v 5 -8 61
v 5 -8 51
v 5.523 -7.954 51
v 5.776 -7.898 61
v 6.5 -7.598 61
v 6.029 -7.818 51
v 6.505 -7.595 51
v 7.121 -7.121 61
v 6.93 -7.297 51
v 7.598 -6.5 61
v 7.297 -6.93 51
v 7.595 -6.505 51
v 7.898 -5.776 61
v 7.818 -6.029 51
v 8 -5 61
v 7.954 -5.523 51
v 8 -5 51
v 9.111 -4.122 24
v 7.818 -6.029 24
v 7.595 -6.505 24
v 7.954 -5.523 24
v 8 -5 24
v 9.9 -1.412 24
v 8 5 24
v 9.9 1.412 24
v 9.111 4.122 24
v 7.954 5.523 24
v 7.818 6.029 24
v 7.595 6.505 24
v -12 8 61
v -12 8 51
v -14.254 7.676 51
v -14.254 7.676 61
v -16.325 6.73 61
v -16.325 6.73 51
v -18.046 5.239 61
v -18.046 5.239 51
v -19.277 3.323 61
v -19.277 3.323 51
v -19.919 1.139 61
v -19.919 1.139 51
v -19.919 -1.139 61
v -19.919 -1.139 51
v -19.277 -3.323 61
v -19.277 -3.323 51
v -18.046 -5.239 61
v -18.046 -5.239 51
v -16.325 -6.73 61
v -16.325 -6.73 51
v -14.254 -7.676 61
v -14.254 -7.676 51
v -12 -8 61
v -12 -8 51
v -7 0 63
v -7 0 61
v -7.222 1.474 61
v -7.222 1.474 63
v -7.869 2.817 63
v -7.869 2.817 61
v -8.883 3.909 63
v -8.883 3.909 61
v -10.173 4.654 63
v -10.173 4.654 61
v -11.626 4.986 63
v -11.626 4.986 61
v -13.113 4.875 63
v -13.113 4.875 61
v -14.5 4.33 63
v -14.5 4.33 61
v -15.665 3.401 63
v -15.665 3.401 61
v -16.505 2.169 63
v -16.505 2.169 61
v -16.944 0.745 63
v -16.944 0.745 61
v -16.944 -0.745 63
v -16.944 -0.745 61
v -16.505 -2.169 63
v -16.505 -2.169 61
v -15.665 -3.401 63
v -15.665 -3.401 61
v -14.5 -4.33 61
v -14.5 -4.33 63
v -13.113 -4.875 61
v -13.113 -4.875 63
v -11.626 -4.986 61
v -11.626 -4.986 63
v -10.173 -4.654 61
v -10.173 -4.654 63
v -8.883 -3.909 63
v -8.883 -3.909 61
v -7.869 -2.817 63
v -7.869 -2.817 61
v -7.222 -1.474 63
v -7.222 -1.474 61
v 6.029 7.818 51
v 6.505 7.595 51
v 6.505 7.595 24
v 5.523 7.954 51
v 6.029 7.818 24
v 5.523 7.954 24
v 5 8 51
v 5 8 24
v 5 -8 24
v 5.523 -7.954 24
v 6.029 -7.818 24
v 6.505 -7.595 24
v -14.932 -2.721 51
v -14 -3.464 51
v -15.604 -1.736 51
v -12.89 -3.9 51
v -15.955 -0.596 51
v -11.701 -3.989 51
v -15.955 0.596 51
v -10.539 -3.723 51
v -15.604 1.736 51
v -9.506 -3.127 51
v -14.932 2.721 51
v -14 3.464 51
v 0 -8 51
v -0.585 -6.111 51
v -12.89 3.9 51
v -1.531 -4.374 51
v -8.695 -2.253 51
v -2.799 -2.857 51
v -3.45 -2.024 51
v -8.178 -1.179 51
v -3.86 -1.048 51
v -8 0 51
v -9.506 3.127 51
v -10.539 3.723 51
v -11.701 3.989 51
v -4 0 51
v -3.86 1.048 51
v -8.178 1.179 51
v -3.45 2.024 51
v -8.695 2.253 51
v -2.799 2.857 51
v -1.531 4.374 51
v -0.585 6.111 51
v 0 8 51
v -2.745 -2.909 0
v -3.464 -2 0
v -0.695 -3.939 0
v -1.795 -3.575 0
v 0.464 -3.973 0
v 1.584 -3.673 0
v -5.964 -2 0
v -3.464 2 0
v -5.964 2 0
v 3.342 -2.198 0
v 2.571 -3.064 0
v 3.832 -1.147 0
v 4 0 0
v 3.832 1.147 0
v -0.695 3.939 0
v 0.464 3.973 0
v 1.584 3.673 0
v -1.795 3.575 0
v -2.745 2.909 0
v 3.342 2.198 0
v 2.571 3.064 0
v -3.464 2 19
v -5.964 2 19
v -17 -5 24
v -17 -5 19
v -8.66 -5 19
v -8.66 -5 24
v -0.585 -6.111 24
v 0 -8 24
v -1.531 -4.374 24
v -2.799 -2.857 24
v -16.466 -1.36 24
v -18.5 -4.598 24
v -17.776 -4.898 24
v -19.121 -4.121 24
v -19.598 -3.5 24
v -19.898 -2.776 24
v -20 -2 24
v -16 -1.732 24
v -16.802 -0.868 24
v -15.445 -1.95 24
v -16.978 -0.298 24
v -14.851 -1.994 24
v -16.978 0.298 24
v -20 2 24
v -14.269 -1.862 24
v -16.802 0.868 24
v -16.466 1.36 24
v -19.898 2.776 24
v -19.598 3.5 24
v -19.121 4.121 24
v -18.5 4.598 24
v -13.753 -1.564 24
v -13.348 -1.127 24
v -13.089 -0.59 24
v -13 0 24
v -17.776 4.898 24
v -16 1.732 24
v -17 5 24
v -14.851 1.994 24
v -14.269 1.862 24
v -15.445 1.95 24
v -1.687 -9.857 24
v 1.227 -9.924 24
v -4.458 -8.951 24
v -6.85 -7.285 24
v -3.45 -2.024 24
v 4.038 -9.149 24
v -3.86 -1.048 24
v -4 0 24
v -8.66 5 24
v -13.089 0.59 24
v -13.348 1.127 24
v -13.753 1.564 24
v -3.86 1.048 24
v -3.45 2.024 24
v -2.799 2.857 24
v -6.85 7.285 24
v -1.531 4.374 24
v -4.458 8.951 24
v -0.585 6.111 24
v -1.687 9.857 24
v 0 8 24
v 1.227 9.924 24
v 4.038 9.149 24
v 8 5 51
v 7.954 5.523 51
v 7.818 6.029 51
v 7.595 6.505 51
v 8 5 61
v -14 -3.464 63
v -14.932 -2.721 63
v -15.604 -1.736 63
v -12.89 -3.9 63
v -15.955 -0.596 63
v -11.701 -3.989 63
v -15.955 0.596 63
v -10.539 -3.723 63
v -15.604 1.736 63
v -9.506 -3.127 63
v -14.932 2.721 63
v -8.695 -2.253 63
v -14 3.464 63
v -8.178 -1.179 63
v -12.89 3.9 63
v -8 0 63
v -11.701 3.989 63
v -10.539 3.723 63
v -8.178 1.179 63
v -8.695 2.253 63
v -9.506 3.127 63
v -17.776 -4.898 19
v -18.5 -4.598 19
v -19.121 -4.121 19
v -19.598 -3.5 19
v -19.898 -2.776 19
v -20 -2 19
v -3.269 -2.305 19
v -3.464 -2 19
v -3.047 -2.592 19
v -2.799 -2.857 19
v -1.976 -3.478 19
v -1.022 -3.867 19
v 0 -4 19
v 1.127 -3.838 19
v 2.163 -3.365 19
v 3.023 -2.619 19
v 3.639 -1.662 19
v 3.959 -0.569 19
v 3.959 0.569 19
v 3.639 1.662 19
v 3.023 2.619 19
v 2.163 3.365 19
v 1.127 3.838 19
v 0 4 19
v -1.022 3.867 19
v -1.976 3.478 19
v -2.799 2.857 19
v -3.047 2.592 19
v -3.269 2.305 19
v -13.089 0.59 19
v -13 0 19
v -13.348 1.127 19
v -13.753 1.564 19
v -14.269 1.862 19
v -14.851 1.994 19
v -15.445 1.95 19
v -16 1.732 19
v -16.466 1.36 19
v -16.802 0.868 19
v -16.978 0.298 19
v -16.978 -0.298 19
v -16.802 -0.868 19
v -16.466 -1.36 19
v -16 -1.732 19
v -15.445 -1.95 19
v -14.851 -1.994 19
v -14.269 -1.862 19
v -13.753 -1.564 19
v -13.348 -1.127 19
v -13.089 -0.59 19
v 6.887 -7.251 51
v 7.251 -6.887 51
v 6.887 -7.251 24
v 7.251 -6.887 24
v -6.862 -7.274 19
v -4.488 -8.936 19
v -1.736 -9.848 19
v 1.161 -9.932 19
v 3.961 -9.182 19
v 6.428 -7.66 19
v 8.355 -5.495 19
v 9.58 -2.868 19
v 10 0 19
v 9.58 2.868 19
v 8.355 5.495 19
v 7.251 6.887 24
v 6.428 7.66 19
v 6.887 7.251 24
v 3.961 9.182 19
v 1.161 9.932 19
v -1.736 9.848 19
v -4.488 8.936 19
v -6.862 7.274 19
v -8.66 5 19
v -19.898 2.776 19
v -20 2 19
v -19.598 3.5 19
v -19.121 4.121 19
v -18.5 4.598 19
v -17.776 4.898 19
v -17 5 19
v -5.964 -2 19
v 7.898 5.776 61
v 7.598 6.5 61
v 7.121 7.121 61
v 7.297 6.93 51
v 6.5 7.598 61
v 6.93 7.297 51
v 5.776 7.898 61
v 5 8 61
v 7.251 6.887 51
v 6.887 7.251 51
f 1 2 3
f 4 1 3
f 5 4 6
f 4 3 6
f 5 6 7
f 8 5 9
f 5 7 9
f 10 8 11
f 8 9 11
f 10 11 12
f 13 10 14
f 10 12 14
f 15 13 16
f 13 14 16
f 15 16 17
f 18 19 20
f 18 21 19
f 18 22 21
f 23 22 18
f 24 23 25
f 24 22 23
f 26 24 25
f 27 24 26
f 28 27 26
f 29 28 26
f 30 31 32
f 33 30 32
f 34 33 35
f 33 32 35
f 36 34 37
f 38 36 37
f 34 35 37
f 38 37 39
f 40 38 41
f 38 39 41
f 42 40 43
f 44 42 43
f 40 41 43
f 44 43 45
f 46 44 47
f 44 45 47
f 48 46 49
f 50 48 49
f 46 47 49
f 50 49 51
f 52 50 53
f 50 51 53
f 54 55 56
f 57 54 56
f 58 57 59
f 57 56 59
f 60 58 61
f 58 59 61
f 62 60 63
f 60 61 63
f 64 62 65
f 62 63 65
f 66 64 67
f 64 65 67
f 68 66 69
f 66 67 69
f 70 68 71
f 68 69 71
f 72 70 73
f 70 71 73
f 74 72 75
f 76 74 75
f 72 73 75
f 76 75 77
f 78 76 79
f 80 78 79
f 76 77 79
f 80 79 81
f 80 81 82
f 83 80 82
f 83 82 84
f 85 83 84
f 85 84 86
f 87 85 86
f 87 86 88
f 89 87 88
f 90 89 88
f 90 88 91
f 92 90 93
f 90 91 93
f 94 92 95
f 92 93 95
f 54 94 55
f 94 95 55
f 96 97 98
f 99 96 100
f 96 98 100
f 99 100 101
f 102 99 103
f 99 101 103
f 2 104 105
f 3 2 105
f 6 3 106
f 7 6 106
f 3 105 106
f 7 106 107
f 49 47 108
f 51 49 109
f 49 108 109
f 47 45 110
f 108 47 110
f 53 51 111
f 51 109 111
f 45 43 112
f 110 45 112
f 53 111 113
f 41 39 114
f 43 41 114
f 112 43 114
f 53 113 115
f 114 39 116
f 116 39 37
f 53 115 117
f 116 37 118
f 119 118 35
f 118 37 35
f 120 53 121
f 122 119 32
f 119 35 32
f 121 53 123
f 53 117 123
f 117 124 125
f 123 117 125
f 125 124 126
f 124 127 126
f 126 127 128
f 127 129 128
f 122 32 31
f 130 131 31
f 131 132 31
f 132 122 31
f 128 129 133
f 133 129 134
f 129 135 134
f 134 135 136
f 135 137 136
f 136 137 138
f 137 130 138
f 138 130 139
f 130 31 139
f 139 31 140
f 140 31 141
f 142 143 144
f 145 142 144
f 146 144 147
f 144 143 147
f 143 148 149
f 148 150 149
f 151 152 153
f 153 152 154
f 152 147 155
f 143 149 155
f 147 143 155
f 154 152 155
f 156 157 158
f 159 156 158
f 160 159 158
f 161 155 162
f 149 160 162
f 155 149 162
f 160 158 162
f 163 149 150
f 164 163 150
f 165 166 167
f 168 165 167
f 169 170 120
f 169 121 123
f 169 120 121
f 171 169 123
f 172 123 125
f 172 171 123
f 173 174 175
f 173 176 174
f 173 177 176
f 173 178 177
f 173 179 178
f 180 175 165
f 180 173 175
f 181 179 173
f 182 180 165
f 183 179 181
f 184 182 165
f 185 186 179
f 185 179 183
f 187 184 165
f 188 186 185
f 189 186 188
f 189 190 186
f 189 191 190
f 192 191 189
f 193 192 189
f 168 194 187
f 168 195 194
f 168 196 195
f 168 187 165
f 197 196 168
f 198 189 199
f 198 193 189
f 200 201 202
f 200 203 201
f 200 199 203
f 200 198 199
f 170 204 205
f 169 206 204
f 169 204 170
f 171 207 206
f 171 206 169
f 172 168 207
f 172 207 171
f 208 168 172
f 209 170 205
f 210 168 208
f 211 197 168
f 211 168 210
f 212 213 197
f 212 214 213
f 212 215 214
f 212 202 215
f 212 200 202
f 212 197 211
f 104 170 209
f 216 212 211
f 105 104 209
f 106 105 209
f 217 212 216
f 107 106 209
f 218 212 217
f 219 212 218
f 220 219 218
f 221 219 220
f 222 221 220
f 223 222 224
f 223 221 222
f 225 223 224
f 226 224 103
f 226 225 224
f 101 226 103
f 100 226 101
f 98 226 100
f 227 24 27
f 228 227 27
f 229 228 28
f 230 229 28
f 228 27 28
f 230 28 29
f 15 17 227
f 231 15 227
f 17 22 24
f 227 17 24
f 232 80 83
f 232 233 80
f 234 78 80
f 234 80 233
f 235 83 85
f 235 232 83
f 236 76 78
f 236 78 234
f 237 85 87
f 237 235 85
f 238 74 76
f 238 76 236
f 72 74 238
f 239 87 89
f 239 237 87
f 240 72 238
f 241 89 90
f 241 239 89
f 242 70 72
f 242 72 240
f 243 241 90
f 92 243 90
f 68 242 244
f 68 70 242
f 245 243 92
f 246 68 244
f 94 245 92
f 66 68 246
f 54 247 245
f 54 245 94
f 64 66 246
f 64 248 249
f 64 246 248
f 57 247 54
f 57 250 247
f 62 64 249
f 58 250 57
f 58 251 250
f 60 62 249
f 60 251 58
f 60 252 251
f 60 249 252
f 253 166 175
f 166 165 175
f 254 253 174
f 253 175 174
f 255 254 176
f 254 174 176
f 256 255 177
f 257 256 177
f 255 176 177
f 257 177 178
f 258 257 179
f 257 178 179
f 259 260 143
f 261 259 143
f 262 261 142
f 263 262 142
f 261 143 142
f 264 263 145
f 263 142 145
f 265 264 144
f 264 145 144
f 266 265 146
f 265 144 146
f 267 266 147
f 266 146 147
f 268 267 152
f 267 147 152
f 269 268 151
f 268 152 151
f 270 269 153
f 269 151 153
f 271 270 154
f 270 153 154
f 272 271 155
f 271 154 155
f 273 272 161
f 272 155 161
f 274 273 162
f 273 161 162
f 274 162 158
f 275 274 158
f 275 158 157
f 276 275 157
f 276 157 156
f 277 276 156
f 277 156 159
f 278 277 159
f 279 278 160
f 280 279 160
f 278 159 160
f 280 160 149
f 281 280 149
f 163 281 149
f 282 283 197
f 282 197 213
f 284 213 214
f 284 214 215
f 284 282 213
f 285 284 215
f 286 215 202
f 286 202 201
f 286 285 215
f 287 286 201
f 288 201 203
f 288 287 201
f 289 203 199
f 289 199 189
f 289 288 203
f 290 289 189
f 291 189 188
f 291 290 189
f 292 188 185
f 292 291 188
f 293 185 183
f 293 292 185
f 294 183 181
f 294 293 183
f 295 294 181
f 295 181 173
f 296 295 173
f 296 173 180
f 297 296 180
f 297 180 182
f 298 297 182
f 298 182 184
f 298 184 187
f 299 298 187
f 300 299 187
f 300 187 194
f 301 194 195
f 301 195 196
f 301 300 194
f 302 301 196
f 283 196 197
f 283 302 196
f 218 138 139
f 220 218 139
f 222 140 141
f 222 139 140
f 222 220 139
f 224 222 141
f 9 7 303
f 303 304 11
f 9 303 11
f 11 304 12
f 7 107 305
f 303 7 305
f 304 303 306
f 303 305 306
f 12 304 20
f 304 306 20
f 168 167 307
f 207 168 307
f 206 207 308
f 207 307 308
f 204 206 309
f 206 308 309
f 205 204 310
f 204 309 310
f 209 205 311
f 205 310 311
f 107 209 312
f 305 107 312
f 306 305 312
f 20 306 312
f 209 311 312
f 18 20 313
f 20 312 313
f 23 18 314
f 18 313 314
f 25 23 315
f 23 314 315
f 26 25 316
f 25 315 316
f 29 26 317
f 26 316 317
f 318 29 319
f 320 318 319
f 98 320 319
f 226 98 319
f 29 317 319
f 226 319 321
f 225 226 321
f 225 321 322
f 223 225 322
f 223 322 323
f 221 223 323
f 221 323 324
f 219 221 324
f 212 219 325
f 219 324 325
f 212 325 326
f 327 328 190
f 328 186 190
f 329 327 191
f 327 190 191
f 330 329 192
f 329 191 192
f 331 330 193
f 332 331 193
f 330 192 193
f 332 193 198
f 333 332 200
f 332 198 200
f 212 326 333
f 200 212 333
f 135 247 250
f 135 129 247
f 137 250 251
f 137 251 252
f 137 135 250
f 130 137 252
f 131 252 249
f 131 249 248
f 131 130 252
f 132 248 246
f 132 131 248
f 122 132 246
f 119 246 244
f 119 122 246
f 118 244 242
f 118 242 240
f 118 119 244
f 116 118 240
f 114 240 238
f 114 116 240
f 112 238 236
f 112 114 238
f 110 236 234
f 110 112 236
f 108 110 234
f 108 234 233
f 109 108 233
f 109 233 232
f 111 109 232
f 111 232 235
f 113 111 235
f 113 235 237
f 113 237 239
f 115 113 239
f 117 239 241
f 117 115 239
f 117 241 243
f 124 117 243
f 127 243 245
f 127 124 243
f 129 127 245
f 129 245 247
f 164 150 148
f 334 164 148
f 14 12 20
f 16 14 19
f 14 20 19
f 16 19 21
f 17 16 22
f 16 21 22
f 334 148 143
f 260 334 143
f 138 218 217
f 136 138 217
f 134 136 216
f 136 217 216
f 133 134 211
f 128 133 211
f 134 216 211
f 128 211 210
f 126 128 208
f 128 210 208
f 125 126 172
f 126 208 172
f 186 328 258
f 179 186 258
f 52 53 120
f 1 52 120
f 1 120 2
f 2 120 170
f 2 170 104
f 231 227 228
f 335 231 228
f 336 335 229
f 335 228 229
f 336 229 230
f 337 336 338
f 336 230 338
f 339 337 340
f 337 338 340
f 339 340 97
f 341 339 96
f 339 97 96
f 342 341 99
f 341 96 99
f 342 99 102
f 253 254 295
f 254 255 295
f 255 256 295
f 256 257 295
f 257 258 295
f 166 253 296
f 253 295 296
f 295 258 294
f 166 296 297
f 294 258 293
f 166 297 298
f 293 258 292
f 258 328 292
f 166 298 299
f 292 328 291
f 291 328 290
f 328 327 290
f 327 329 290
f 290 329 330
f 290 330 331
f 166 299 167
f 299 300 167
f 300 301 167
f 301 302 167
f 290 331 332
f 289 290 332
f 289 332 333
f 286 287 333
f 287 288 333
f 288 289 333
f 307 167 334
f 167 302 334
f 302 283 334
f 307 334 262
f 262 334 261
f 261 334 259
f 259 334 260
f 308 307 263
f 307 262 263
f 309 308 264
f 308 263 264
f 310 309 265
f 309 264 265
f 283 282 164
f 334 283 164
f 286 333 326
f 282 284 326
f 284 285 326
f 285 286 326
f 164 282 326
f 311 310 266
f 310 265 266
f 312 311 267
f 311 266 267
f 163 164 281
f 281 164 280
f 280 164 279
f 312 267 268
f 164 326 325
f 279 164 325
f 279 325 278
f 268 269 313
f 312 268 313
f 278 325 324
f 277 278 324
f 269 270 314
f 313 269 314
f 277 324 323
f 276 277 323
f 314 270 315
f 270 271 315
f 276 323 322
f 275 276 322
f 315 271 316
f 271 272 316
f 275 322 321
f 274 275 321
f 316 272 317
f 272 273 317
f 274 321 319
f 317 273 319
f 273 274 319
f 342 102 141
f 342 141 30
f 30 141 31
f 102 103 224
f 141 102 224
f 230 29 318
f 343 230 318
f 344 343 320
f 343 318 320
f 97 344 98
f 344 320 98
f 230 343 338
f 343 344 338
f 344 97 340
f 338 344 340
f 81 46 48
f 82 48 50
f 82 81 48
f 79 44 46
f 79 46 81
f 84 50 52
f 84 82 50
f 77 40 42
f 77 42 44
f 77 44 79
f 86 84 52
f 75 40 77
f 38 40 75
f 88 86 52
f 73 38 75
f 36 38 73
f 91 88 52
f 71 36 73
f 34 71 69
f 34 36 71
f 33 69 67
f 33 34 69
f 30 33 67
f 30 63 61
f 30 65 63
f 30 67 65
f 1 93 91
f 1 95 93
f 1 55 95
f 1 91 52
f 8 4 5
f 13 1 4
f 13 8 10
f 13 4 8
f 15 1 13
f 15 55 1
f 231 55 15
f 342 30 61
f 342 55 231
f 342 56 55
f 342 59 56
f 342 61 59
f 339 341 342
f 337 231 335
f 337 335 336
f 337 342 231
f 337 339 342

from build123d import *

# Parameters (mm, degrees)
RESSALTO_EXTRUS_O2_DEPTH  = 19
ESBO_O2_R                 = 2
RESSALTO_EXTRUS_O3_DEPTH  = 5
FILETE1_R                 = 3
ESBO_O3_R                 = 4
RESSALTO_EXTRUS_O4_DEPTH  = 17
RESSALTO_EXTRUS_O6_START  = 10
ESBO_O4_R                 = 4
RESSALTO_EXTRUS_O6_DEPTH  = 10
ESBO_O5_R                 = 4
RESSALTO_EXTRUS_O7_DEPTH  = 10
RESSALTO_EXTRUS_O10_DEPTH = 27
FILETE2_R                 = 10
ESBO_O8_R                 = 5
ESBO_O8_R_2               = 4
RESSALTO_EXTRUS_O11_DEPTH = 2


with BuildPart() as part:
    # Esboço1 → Ressalto-extrusão2 (new body)
    with BuildSketch(Plane.XY):
        with BuildLine():
            Line((-5.964101615, -2), (-3.464101615, -2))
            ThreePointArc((-3.464101615, -2), (4, 0), (-3.464101615, 2))
            Line((-3.464101615, 2), (-5.964101615, 2))
            Line((-5.964101615, 2), (-5.964101615, -2))
        make_face()
    extrude(amount=RESSALTO_EXTRUS_O2_DEPTH)

    # Esboço2 → Ressalto-extrusão3 (add)
    with BuildSketch(Plane.XY.offset(19)):
        with BuildLine():
            Line((-20, -5), (-8.660254038, -5))
            ThreePointArc((-8.660254038, -5), (10, 0), (-8.660254038, 5))
            Line((-8.660254038, 5), (-20, 5))
            Line((-20, 5), (-20, -5))
        make_face()
        with Locations((-15, 0)):
            Circle(ESBO_O2_R, mode=Mode.SUBTRACT)
    extrude(amount=RESSALTO_EXTRUS_O3_DEPTH)

    # Filete1
    filete1_edges = [part.edges().sort_by_distance(p)[0] for p in [
        (-20, 5, 21.5),
        (-20, -5, 21.5),
    ]]
    fillet(filete1_edges, radius=FILETE1_R)

    # Esboço3 → Ressalto-extrusão4 (add)
    with BuildSketch(Plane.XY.offset(24)):
        Circle(ESBO_O3_R)
    extrude(amount=RESSALTO_EXTRUS_O4_DEPTH)

    # Esboço5 → Ressalto-extrusão7 (add)
    with BuildSketch(Plane.XY.offset(41)):
        Circle(ESBO_O5_R)
    extrude(amount=RESSALTO_EXTRUS_O7_DEPTH)



with BuildPart() as body_2:
    # Esboço4 → Ressalto-extrusão6 (new body)
    with BuildSketch(Plane.XY.offset(41).offset(RESSALTO_EXTRUS_O6_START)):
        with BuildLine():
            Line((4, -8), (5, -8))
            ThreePointArc((5, -8), (7.121320344, -7.121320344), (8, -5))
            Line((8, -5), (8, 5))
            ThreePointArc((8, 5), (7.121320344, 7.121320344), (5, 8))
            Line((5, 8), (4, 8))
            Line((4, 8), (-4, 8))
            Line((-4, 8), (-12, 8))
            ThreePointArc((-12, 8), (-20, 0), (-12, -8))
            Line((-12, -8), (-4, -8))
            Line((-4, -8), (4, -8))
        make_face()
        with Locations((-12, 0)):
            Circle(ESBO_O4_R, mode=Mode.SUBTRACT)
    extrude(amount=RESSALTO_EXTRUS_O6_DEPTH)


with BuildPart() as part_1:
    add(part.part)

    add(body_2.part)  # Ressalto-extrusão10 merges body 2
    # Esboço7 → Ressalto-extrusão10 (add)
    with BuildSketch(Plane.XY.offset(24)):
        with BuildLine():
            Line((0, 8), (0, 4))
            ThreePointArc((0, 4), (2.828427125, 2.828427125), (4, 0))
            ThreePointArc((4, 0), (2.828427125, -2.828427125), (0, -4))
            Line((0, -4), (0, -8))
            Line((0, -8), (5, -8))
            ThreePointArc((5, -8), (5.779003589, -7.897093959), (6.504564394, -7.595435606))
            ThreePointArc((6.504564394, -7.595435606), (7.071067812, -7.071067812), (7.595435606, -6.504564394))
            ThreePointArc((7.595435606, -6.504564394), (7.897093959, -5.779003589), (8, -5))
            Line((8, -5), (8, 5))
            ThreePointArc((8, 5), (7.897093959, 5.779003589), (7.595435606, 6.504564394))
            ThreePointArc((7.595435606, 6.504564394), (7.071067812, 7.071067812), (6.504564394, 7.595435606))
            ThreePointArc((6.504564394, 7.595435606), (5.779003589, 7.897093959), (5, 8))
            Line((5, 8), (0, 8))
        make_face()
    extrude(amount=RESSALTO_EXTRUS_O10_DEPTH)

    # Filete2
    # the kernel refuses this fillet: 10 mm, written as the material it adds along each edge
    with BuildSketch(Plane(origin=(0, -4, 14), x_dir=(0, -1, 0), z_dir=(0, 0, 1))) as filete2_piece_1_section:
        with BuildLine():
            CenterArc((6, -9.797958971), FILETE2_R, 101.536959033, 34.04773237)
            ThreePointArc((-1.142857143, -2.799416849), (-0.296719601, -1.511857892), (0, 0))
            Line((0, 0), (4, 0))
        make_face()
    filete2_piece_1 = extrude(amount=47, mode=Mode.PRIVATE)
    filete2_piece_1 = split(filete2_piece_1, bisect_by=Plane(origin=(-0.997292113, -5.209523734, 19), z_dir=(0, 0, 1)), keep=Keep.TOP, mode=Mode.PRIVATE)
    add(filete2_piece_1)
    with BuildSketch(Plane(origin=(0, 4, 14), x_dir=(-0.9258200997725515, -0.3779644730092269, 0), z_dir=(0, 0, 1))) as filete2_piece_2_section:
        with BuildLine():
            CenterArc((6.803360514, -9.258200998), FILETE2_R, 112.207654299, 34.04773237)
            Line((-1.511857892, -3.703280399), (0, 0))
            ThreePointArc((0, 0), (1.511857892, -0.296719601), (3.023715784, 0))
        make_face()
    filete2_piece_2 = extrude(amount=47, mode=Mode.PRIVATE)
    filete2_piece_2 = split(filete2_piece_2, bisect_by=Plane(origin=(-0.997292113, 5.209523734, 19), z_dir=(0, 0, 1)), keep=Keep.TOP, mode=Mode.PRIVATE)
    add(filete2_piece_2)

    # Esboço8 → Ressalto-extrusão11 (add)
    with BuildSketch(Plane.XY.offset(61)):
        with Locations((-12, 0)):
            Circle(ESBO_O8_R)
        with Locations((-12, 0)):
            Circle(ESBO_O8_R_2, mode=Mode.SUBTRACT)
    extrude(amount=RESSALTO_EXTRUS_O11_DEPTH)


solid = part_1.part
